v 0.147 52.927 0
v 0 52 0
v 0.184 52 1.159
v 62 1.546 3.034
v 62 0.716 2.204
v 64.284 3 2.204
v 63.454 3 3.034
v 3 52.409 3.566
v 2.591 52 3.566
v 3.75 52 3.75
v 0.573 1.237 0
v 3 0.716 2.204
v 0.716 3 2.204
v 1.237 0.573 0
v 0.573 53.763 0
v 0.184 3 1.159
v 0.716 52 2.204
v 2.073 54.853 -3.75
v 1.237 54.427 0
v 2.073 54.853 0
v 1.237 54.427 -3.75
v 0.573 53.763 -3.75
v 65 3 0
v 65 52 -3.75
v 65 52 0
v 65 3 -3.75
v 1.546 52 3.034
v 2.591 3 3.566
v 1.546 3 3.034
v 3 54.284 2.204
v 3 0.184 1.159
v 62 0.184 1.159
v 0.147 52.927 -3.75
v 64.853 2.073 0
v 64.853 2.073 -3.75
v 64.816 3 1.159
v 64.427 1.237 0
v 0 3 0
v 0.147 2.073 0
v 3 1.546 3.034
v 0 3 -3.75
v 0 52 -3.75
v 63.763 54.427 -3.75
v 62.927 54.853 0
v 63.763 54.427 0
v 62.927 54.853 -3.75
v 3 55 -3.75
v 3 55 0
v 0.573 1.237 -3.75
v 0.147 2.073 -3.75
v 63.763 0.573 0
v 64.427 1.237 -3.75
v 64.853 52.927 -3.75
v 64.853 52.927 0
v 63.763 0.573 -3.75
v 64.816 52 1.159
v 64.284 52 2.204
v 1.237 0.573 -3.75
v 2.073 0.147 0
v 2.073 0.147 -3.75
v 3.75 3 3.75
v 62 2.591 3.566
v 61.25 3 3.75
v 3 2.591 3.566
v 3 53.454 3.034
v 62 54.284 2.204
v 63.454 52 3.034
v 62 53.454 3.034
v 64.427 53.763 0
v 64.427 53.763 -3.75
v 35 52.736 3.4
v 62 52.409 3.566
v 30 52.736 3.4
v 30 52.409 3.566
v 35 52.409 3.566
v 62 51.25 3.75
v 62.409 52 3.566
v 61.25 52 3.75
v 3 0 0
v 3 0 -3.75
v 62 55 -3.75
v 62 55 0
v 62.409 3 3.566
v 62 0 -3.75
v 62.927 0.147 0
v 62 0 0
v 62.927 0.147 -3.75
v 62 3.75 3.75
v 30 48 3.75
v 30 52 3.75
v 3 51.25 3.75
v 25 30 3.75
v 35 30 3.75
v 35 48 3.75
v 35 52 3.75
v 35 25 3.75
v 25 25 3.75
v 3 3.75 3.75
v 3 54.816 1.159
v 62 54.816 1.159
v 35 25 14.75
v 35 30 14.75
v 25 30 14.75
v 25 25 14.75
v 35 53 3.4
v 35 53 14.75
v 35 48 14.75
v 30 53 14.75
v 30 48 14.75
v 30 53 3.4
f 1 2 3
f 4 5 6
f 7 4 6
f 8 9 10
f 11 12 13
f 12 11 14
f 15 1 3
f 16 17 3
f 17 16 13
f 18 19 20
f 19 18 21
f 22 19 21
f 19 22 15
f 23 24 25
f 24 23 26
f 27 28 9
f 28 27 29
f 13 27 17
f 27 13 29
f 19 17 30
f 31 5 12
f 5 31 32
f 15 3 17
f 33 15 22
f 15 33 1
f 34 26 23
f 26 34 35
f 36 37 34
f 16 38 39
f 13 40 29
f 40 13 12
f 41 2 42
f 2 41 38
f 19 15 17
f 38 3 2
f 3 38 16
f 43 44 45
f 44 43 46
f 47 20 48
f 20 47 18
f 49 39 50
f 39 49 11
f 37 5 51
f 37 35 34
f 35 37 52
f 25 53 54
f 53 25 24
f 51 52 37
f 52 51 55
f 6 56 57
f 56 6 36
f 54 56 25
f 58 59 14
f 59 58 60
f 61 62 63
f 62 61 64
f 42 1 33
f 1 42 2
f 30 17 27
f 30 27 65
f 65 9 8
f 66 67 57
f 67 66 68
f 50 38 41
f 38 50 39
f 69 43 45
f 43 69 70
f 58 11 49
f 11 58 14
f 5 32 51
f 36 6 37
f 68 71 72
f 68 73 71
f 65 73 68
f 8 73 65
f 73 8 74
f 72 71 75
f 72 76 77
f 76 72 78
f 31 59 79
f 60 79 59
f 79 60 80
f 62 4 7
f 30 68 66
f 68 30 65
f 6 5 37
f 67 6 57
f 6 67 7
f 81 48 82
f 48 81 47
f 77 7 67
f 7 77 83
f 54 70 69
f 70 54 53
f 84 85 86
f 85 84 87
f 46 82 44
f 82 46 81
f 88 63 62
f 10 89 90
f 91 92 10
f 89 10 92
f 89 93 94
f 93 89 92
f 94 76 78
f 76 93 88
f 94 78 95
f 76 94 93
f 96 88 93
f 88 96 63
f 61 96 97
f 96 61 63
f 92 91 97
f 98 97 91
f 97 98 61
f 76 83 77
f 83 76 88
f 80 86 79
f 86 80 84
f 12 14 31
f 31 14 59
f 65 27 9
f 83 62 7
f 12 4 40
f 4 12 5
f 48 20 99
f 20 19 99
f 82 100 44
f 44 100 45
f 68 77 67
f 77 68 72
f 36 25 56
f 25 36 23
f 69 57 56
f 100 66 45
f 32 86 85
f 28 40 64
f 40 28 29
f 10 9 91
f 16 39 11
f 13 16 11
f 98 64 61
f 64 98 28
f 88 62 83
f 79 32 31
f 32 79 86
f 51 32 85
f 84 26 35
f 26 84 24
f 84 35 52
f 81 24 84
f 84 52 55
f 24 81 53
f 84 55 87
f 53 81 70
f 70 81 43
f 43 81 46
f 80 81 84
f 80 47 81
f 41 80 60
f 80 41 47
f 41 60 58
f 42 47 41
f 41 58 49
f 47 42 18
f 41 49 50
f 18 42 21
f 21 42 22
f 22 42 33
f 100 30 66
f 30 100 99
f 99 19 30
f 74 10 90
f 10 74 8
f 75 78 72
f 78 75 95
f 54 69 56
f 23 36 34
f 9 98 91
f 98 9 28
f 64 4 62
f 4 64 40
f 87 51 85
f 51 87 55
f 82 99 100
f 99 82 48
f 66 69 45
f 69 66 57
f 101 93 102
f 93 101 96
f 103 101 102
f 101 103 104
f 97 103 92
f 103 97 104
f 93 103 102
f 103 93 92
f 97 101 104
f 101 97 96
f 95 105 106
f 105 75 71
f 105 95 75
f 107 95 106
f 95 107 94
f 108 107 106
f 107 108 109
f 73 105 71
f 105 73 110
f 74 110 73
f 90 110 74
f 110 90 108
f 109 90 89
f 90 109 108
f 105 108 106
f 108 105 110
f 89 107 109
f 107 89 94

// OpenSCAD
//FootRight

//variables
xRectangle = 65;
yRectangle = 55;
zRectangle = 7.5;

xBigRectangle = 10;
yBigRectangle = 5;
zBigRectangle = 11;

xSmallRectangle = 5;
ySmallRectangle = 5;
zSmallRectangleLong = 11.35;
zSmallRectangleShort = 11;

angleRadius = 3;

nFaces=20;

//modules
module bigRectangle(){
    cube([xBigRectangle, yBigRectangle, zBigRectangle]);
}

module smallRectangle(){
    cube([xSmallRectangle, ySmallRectangle, zSmallRectangleLong]);
}

module base(){
      hull(){
        //atras
        translate([zRectangle/2,angleRadius,0])
            rotate([270,90,0])
                cylinder(h=yRectangle-2*angleRadius, d=zRectangle, $fn=20);
    
        //alante
        translate([xRectangle-zRectangle/2,angleRadius,0])
            rotate([270,90,0])
                cylinder(h=yRectangle-2*angleRadius, d=zRectangle, $fn=20);
    
        //izqda
        translate([angleRadius,zRectangle/2,0])
            rotate([0,90,0])
                cylinder(h=xRectangle-2*angleRadius, d=zRectangle, $fn=20);
        
        //dcha
        translate([angleRadius,yRectangle-zRectangle/2,0])
            rotate([0,90,0])
                cylinder(h=xRectangle-2*angleRadius, d=zRectangle, $fn=20);
        
        //esquinas
        translate([angleRadius, angleRadius, -zRectangle/2])
            cylinder(h=zRectangle/2,d=angleRadius*2, $fn=20);
        translate([xRectangle-angleRadius, angleRadius, -zRectangle/2])
            cylinder(h=zRectangle/2,d=angleRadius*2, $fn=20);
        translate([angleRadius, yRectangle-angleRadius, -zRectangle/2])
            cylinder(h=zRectangle/2,d=angleRadius*2, $fn=20);
        translate([xRectangle-angleRadius, yRectangle-angleRadius, -zRectangle/2])
            cylinder(h=zRectangle/2,d=angleRadius*2, $fn=20);
    }
}

module footRight(){
    union(){
        base();
        
        translate([xRectangle/2-xSmallRectangle*1.5,yRectangle/2-yBigRectangle/2,zRectangle/2])
        bigRectangle();
        
        translate([xRectangle/2-xSmallRectangle/2,yRectangle-ySmallRectangle-angleRadius/1.5,zRectangle/2-(zSmallRectangleLong-zSmallRectangleShort)])
        smallRectangle();
    }
}

footRight();
